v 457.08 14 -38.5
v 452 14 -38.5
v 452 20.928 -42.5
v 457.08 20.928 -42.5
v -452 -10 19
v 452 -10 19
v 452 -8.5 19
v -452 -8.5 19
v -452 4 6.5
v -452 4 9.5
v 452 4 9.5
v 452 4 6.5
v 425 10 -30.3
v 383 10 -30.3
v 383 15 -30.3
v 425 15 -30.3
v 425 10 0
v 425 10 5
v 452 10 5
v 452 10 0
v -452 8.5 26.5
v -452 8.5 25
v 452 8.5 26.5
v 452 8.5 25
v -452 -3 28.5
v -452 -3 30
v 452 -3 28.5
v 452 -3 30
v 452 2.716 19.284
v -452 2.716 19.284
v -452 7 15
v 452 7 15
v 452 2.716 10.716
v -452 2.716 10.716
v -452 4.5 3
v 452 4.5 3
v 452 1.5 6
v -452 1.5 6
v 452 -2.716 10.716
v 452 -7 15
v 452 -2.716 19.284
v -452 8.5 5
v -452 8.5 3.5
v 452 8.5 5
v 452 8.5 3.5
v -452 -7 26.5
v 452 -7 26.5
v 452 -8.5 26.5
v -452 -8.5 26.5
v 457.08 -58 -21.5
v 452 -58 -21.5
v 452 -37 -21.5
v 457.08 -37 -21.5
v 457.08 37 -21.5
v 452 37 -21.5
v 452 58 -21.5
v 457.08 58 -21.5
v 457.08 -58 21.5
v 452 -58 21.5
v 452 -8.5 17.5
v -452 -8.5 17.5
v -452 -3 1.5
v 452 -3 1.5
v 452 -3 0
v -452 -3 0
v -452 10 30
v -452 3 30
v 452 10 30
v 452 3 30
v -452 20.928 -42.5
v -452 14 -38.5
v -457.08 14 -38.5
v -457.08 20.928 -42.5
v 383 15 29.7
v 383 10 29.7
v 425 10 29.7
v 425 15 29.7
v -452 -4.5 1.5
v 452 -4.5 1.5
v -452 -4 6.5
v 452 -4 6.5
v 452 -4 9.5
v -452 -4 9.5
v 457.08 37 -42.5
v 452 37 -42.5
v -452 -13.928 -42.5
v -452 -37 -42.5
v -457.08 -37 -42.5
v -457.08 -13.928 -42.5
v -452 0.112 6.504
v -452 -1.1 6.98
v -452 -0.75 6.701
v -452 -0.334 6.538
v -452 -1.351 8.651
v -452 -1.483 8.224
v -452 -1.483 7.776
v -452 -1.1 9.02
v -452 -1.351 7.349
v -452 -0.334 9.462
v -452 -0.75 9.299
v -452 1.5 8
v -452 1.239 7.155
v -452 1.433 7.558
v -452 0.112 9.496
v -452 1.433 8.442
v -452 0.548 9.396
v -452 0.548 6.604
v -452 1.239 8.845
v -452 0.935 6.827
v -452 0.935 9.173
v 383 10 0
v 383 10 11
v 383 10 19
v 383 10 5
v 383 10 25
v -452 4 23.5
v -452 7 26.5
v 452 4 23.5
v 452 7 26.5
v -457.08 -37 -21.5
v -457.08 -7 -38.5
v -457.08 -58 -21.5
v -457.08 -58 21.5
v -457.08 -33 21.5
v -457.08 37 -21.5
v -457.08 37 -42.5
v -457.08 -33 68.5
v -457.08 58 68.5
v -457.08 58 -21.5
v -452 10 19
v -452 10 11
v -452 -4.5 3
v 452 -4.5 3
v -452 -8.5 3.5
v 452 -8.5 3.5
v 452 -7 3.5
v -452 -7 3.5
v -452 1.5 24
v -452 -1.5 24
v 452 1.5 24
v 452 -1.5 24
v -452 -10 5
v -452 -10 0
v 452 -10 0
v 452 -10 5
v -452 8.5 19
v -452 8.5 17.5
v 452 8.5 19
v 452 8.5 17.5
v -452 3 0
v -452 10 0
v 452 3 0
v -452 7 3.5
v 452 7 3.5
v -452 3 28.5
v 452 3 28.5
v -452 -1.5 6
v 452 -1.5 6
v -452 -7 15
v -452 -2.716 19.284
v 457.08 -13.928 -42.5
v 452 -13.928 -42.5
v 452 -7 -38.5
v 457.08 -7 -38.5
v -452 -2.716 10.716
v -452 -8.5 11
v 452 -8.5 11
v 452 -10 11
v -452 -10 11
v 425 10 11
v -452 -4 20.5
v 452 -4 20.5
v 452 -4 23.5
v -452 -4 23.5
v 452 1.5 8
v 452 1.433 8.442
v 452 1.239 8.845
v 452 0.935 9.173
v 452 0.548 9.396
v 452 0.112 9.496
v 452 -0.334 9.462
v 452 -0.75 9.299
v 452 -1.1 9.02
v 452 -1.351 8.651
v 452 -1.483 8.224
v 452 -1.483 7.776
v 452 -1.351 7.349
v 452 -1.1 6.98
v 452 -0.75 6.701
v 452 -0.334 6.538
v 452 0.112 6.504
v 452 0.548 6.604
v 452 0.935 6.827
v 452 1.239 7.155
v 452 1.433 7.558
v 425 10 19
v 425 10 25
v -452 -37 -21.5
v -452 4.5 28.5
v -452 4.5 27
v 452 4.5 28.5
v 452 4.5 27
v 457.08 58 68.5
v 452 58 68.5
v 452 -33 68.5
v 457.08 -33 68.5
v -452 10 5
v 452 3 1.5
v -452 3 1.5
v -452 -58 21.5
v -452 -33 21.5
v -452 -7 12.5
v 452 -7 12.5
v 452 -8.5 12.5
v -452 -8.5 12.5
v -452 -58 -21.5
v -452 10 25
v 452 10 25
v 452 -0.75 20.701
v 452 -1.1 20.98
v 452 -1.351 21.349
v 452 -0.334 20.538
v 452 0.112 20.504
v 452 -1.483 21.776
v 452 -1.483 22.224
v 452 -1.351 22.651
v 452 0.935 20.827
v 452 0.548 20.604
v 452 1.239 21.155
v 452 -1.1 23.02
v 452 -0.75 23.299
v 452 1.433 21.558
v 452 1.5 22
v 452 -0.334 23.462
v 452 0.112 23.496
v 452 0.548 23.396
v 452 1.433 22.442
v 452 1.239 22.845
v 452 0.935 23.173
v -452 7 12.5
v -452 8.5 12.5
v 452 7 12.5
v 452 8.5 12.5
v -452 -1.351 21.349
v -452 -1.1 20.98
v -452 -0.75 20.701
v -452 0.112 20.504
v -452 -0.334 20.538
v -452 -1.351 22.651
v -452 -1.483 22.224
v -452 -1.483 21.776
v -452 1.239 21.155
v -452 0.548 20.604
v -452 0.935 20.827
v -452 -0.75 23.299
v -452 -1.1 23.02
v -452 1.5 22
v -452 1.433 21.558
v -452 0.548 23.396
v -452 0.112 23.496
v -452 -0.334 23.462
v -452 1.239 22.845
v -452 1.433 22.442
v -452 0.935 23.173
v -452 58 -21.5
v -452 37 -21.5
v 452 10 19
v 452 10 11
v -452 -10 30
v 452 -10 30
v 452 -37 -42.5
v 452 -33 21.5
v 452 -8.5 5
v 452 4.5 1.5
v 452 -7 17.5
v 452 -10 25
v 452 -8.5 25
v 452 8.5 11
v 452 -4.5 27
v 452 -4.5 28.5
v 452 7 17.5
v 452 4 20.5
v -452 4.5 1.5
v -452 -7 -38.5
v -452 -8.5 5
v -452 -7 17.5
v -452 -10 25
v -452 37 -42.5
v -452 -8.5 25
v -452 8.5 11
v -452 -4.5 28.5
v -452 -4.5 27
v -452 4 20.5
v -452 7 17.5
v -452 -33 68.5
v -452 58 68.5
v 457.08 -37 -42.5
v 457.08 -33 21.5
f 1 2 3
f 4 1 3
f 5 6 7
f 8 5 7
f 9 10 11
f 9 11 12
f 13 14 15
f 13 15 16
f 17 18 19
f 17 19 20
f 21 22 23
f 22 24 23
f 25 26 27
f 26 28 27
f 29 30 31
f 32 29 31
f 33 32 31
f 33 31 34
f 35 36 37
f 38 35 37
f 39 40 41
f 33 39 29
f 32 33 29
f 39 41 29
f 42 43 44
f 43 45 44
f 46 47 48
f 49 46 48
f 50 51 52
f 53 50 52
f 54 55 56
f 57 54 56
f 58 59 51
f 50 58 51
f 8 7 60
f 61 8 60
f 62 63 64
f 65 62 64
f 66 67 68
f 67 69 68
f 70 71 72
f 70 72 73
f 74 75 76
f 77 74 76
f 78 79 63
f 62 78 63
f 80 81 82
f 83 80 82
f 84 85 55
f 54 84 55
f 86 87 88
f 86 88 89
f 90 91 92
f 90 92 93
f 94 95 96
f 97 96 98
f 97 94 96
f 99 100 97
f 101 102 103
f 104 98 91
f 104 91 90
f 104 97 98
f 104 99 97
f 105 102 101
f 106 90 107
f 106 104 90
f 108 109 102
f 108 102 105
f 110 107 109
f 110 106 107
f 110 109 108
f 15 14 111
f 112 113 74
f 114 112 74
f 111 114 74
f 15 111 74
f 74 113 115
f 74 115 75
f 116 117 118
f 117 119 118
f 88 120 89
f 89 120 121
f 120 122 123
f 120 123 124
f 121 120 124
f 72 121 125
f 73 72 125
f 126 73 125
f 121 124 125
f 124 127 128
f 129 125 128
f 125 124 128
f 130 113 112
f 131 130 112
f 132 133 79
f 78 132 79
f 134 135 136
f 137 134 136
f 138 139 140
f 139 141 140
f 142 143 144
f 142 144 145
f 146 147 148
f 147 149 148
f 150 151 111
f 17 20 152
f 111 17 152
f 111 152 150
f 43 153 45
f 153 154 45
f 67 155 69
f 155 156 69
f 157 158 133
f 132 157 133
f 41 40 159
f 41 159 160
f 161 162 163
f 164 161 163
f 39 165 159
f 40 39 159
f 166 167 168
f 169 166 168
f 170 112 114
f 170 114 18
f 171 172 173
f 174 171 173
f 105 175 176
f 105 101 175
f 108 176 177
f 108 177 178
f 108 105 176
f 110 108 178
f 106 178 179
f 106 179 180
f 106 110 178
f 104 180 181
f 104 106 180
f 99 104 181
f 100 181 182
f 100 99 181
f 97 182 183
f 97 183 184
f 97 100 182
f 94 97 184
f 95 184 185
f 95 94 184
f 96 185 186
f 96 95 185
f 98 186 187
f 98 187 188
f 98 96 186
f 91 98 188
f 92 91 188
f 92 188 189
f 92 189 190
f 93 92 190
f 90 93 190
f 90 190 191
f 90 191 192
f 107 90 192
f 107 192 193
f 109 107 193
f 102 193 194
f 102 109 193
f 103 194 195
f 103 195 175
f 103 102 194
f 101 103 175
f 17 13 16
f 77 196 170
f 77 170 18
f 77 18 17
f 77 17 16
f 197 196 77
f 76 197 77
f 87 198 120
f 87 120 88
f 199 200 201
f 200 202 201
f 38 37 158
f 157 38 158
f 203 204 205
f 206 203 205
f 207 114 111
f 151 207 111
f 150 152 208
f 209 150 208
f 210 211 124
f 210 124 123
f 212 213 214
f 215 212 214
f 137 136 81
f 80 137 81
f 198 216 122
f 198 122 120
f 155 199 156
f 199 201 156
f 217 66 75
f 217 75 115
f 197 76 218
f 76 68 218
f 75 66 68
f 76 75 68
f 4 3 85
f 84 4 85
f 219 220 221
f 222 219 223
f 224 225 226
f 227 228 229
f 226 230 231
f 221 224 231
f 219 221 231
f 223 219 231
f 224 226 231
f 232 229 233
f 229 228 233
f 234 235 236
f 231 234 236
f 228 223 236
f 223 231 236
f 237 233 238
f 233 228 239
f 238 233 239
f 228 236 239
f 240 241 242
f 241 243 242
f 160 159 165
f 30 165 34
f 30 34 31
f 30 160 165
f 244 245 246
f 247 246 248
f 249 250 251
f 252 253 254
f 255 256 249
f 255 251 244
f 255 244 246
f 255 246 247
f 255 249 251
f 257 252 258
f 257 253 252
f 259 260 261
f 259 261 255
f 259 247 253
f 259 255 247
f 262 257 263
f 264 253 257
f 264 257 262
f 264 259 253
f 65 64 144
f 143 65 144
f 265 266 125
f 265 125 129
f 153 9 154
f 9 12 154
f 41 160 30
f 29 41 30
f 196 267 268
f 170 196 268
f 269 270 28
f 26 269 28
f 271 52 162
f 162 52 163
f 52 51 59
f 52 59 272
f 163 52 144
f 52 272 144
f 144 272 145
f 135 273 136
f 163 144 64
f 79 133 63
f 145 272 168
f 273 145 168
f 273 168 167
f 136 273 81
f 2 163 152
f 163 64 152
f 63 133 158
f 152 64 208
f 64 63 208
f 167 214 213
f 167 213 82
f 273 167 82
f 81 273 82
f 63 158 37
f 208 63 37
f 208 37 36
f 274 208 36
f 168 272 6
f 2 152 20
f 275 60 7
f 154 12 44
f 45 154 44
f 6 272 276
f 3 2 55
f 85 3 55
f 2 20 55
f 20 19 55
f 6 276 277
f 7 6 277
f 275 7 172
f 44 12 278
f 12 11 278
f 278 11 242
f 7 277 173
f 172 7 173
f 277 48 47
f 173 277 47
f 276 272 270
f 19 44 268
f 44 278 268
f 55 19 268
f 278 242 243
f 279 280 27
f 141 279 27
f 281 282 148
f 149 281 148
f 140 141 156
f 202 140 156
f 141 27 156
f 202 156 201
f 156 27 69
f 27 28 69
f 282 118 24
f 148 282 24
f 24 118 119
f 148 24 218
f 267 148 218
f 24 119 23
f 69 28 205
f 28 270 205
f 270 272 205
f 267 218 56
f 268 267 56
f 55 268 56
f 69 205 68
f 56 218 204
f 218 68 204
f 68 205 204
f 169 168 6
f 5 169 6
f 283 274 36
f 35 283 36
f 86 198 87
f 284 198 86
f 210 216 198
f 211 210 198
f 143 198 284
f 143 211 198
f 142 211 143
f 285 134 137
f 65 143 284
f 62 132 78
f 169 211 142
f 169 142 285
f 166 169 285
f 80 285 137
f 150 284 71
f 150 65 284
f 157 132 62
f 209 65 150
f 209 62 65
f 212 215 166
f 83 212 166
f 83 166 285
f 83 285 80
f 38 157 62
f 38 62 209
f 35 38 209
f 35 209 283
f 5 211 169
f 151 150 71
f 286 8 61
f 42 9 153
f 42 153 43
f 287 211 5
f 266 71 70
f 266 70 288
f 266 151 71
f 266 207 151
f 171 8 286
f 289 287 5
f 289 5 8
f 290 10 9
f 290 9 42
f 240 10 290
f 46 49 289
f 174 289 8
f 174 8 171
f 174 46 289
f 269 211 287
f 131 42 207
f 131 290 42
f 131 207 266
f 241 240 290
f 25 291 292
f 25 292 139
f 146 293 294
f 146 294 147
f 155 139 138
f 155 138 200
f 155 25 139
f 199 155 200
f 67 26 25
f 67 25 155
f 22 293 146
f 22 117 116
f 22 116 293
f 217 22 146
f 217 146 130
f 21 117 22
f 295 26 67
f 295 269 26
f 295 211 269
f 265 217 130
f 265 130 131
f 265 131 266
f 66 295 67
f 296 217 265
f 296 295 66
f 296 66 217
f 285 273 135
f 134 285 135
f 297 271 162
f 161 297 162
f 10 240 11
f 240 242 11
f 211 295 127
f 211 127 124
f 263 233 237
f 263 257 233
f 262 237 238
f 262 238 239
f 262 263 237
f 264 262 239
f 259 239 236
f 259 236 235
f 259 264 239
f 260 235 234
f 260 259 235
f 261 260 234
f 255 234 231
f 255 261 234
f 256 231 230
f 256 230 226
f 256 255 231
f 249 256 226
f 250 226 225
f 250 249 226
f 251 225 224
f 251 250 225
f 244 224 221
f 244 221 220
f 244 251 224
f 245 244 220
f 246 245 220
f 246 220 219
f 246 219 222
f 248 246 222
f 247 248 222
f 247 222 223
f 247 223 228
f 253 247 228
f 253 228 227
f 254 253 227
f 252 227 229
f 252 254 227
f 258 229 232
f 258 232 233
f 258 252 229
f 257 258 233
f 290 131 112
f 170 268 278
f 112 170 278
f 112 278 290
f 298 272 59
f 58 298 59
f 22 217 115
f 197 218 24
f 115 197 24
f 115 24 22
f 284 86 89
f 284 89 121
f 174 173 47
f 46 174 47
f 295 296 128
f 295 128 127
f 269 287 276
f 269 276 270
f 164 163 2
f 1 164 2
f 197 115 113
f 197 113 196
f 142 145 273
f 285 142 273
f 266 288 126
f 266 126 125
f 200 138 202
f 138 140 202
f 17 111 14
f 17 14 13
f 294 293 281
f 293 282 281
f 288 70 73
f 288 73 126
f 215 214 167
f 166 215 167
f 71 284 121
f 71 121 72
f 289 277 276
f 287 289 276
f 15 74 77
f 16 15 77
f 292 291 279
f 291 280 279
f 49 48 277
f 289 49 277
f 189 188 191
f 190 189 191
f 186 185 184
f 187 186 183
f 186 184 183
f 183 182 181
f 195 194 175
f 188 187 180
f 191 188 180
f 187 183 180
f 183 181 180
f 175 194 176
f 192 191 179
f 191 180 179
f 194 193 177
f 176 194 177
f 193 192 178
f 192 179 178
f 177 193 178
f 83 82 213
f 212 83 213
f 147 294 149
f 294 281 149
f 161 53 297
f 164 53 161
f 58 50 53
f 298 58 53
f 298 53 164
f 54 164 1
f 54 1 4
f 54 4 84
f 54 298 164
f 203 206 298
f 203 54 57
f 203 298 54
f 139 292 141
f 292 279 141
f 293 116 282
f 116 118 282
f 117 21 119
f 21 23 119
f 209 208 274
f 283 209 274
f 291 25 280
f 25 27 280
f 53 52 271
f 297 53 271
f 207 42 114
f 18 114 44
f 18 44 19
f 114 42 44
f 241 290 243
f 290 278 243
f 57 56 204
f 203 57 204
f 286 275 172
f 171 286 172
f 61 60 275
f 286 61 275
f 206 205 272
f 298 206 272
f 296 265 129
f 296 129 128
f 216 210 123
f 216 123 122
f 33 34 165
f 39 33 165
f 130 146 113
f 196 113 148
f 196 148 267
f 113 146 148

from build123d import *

# Parameters (mm, degrees)
SKETCH_R     = 1.5
PAD_DEPTH    = 452
PAD001_DEPTH = 5.08
SKETCH002_W  = 42
SKETCH002_H  = 60
PAD002_DEPTH = 5


with BuildPart() as part:
    # Sketch → Pad (new body, symmetric)
    with BuildSketch(Plane.YZ):
        Polygon((-10, 30), (-3, 30), (-3, 28.5), (-4.5, 28.5), (-4.5, 27), (-1.5, 24), (1.5, 24), (4.5, 27), (4.5, 28.5), (3, 28.5), (3, 30), (10, 30), (10, 25), (8.5, 25), (8.5, 26.5), (7, 26.5), (4, 23.5), (4, 20.5), (7, 17.5), (8.5, 17.5), (8.5, 19), (10, 19), (10, 11), (8.5, 11), (8.5, 12.5), (7, 12.5), (4, 9.5), (4, 6.5), (7, 3.5), (8.5, 3.5), (8.5, 5), (10, 5), (10, 0), (3, 0), (3, 1.5), (4.5, 1.5), (4.5, 3), (1.5, 6), (-1.5, 6), (-4.5, 3), (-4.5, 1.5), (-3, 1.5), (-3, 0), (-10, 0), (-10, 5), (-8.5, 5), (-8.5, 3.5), (-7, 3.5), (-4, 6.5), (-4, 9.5), (-7, 12.5), (-8.5, 12.5), (-8.5, 11), (-10, 11), (-10, 19), (-8.5, 19), (-8.5, 17.5), (-7, 17.5), (-4, 20.5), (-4, 23.5), (-7, 26.5), (-8.5, 26.5), (-8.5, 25), (-10, 25), align=None)
        with Locations((0, 8)):
            Circle(SKETCH_R, mode=Mode.SUBTRACT)
        with Locations((0, 22)):
            Circle(SKETCH_R, mode=Mode.SUBTRACT)
        Polygon((-7, 15), (-2.716354, 19.283646), (2.716354, 19.283646), (7, 15), (2.716354, 10.716354), (-2.716354, 10.716354), align=None, mode=Mode.SUBTRACT)
    extrude(amount=PAD_DEPTH, both=True)

    # Sketch001 → Pad001 (join)
    with BuildSketch(Plane.YZ.offset(452)):
        Polygon((-33, 68.5), (-33, 21.5), (-58, 21.5), (-58, -21.5), (-37, -21.5), (-37, -42.5), (-13.928203, -42.5), (-7, -38.5), (14, -38.5), (20.928203, -42.5), (37, -42.5), (37, -21.5), (58, -21.5), (58, 68.5), align=None)
    pad001 = extrude(amount=PAD001_DEPTH)

    # Mirrored: Pad001 across YZ
    add(pad001.mirror(Plane.YZ))

    # Sketch002 → Pad002 (join)
    with BuildSketch(Plane.XZ.offset(-10)):
        with Locations((404, -0.3)):
            Rectangle(SKETCH002_W, SKETCH002_H)
    extrude(amount=-PAD002_DEPTH)


solid = part.part
